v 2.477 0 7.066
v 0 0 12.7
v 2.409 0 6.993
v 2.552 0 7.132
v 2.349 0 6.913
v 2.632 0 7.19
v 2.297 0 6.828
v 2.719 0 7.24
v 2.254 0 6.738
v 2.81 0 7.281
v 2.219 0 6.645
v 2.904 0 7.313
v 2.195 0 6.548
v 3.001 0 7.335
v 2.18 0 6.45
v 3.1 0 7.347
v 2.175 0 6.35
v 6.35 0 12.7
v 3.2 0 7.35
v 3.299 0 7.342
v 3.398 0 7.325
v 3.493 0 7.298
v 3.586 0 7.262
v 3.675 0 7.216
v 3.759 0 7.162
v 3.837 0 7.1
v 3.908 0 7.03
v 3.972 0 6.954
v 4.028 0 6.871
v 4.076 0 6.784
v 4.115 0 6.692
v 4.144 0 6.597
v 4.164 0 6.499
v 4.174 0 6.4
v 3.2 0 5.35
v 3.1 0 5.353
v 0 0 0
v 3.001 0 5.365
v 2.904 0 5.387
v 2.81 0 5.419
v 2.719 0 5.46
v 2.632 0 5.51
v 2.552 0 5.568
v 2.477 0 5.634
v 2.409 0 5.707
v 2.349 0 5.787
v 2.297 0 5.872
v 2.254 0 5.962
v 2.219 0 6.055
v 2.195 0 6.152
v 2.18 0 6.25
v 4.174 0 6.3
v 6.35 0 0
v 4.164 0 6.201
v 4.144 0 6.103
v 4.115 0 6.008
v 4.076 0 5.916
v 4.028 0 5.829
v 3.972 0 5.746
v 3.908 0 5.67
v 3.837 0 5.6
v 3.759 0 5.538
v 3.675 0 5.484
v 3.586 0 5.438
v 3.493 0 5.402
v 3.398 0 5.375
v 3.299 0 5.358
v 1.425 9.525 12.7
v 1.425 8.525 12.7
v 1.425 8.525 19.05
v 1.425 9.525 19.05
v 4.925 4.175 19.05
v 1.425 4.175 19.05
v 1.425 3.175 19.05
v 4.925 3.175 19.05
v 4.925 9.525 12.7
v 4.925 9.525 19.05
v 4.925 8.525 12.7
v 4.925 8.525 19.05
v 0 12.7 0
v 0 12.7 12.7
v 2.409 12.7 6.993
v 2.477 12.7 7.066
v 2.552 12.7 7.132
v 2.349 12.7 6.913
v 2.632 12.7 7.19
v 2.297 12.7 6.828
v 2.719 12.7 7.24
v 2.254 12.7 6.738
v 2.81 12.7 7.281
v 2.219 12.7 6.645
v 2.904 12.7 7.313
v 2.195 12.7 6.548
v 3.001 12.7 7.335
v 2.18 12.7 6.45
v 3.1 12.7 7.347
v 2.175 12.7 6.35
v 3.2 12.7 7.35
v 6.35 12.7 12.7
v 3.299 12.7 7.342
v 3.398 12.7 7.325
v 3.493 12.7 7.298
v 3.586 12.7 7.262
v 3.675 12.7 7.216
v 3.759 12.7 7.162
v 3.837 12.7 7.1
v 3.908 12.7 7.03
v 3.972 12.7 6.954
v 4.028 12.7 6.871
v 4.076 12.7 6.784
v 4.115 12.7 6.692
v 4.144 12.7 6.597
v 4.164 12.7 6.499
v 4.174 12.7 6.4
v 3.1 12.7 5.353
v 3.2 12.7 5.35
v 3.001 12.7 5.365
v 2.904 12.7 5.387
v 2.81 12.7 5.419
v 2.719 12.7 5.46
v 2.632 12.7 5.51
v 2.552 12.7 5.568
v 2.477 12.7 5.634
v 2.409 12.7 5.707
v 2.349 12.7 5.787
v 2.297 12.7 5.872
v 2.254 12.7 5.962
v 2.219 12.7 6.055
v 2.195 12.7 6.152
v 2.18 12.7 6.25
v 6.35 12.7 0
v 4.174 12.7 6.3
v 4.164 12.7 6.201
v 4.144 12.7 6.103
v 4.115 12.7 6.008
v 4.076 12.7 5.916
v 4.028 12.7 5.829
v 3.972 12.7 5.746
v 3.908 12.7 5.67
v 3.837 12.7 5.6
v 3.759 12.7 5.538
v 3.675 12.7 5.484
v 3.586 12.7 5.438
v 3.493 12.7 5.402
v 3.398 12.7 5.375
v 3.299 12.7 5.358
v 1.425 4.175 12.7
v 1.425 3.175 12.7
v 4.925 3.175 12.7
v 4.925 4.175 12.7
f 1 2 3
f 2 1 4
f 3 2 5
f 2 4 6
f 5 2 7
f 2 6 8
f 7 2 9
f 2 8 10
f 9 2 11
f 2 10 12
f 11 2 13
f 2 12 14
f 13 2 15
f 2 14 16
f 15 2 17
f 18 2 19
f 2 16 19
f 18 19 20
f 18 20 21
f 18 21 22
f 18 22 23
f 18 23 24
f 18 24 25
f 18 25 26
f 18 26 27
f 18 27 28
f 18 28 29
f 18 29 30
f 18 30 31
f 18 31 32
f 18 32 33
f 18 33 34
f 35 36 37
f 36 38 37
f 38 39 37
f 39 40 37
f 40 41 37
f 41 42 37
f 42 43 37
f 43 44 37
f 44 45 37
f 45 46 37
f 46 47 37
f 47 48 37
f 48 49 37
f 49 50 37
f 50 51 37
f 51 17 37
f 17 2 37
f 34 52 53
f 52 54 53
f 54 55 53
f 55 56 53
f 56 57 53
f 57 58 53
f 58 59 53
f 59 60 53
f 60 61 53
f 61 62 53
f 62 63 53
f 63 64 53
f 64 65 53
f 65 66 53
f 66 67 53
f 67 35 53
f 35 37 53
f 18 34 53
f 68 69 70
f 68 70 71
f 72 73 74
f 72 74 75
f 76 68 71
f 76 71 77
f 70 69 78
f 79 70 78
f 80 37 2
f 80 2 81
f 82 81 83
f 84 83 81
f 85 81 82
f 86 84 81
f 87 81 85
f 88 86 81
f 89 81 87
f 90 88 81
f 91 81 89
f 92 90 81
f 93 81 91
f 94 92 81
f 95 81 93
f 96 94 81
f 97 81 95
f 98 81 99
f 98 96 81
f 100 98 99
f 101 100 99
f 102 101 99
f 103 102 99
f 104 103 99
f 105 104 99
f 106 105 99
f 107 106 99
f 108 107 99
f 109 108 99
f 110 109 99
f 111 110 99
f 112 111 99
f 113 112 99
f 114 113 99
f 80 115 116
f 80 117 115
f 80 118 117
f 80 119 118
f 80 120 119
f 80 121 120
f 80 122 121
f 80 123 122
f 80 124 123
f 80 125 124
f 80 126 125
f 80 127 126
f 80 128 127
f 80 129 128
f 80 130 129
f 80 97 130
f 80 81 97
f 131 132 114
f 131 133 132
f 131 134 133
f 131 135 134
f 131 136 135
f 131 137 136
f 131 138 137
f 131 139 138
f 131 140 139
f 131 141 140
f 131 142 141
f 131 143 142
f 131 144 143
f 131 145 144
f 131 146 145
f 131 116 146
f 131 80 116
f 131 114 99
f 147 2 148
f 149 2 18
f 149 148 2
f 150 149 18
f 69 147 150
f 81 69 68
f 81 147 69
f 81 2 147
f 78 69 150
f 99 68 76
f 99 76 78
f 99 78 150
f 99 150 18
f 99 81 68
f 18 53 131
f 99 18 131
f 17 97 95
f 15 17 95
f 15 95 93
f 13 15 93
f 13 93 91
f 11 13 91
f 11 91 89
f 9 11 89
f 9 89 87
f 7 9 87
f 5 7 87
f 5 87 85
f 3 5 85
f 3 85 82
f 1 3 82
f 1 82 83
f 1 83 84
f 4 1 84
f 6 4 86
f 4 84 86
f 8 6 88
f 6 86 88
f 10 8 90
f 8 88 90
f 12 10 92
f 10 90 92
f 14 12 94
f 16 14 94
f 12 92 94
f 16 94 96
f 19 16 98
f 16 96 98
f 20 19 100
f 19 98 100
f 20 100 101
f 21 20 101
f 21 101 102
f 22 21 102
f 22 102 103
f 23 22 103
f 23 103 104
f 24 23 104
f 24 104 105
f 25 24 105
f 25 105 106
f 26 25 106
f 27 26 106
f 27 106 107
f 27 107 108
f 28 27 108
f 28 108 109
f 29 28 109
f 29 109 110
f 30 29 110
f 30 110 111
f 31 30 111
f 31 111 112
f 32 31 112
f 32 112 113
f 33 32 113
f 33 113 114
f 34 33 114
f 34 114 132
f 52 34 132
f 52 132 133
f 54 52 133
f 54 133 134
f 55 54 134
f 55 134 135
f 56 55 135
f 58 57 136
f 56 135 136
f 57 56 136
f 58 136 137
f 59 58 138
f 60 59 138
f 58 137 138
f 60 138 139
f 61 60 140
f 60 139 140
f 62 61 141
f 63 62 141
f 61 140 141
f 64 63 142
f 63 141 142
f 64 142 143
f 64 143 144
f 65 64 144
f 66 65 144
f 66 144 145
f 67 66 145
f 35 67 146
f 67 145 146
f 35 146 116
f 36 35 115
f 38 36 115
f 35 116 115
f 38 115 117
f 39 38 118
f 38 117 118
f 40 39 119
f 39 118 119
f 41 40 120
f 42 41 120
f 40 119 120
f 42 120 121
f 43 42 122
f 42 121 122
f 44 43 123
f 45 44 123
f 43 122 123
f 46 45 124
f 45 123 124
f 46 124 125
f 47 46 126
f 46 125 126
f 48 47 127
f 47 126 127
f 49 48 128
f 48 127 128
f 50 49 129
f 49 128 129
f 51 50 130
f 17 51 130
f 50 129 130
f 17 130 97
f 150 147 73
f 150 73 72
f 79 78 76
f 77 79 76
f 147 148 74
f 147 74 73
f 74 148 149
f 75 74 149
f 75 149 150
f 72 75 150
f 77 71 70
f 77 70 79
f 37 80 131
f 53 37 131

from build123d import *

# Parameters (mm, degrees)
F0_W     = 6.35
F0_H     = 12.7
F1_DEPTH = 12.7
F2_W     = 3.5
F2_H     = 1
F3_DEPTH = 6.35
F4_R     = 1
F5_DEPTH = 12.701


with BuildPart() as f1:
    # F0 (on Top) → F1 (new body)
    with BuildSketch(Plane.XY):
        with Locations((3.175, 6.35)):
            Rectangle(F0_W, F0_H)
    extrude(amount=F1_DEPTH)

    # F2 (on face) → F3 (join)
    with BuildSketch(Plane.XY.offset(12.7)):
        with Locations((3.175, 9.025)):
            Rectangle(F2_W, F2_H)
        with Locations((3.175, 3.675)):
            Rectangle(F2_W, F2_H)
    extrude(amount=F3_DEPTH)

    # F4 (on face) → F5 (cut, through all)
    with BuildSketch(Plane(origin=(0, 12.7, 0), x_dir=(-1, 0, 0), z_dir=(0, 1, 0))):
        with Locations((-3.175, 6.35)):
            Circle(F4_R)
    extrude(amount=-F5_DEPTH, mode=Mode.SUBTRACT)


solid = f1.part
